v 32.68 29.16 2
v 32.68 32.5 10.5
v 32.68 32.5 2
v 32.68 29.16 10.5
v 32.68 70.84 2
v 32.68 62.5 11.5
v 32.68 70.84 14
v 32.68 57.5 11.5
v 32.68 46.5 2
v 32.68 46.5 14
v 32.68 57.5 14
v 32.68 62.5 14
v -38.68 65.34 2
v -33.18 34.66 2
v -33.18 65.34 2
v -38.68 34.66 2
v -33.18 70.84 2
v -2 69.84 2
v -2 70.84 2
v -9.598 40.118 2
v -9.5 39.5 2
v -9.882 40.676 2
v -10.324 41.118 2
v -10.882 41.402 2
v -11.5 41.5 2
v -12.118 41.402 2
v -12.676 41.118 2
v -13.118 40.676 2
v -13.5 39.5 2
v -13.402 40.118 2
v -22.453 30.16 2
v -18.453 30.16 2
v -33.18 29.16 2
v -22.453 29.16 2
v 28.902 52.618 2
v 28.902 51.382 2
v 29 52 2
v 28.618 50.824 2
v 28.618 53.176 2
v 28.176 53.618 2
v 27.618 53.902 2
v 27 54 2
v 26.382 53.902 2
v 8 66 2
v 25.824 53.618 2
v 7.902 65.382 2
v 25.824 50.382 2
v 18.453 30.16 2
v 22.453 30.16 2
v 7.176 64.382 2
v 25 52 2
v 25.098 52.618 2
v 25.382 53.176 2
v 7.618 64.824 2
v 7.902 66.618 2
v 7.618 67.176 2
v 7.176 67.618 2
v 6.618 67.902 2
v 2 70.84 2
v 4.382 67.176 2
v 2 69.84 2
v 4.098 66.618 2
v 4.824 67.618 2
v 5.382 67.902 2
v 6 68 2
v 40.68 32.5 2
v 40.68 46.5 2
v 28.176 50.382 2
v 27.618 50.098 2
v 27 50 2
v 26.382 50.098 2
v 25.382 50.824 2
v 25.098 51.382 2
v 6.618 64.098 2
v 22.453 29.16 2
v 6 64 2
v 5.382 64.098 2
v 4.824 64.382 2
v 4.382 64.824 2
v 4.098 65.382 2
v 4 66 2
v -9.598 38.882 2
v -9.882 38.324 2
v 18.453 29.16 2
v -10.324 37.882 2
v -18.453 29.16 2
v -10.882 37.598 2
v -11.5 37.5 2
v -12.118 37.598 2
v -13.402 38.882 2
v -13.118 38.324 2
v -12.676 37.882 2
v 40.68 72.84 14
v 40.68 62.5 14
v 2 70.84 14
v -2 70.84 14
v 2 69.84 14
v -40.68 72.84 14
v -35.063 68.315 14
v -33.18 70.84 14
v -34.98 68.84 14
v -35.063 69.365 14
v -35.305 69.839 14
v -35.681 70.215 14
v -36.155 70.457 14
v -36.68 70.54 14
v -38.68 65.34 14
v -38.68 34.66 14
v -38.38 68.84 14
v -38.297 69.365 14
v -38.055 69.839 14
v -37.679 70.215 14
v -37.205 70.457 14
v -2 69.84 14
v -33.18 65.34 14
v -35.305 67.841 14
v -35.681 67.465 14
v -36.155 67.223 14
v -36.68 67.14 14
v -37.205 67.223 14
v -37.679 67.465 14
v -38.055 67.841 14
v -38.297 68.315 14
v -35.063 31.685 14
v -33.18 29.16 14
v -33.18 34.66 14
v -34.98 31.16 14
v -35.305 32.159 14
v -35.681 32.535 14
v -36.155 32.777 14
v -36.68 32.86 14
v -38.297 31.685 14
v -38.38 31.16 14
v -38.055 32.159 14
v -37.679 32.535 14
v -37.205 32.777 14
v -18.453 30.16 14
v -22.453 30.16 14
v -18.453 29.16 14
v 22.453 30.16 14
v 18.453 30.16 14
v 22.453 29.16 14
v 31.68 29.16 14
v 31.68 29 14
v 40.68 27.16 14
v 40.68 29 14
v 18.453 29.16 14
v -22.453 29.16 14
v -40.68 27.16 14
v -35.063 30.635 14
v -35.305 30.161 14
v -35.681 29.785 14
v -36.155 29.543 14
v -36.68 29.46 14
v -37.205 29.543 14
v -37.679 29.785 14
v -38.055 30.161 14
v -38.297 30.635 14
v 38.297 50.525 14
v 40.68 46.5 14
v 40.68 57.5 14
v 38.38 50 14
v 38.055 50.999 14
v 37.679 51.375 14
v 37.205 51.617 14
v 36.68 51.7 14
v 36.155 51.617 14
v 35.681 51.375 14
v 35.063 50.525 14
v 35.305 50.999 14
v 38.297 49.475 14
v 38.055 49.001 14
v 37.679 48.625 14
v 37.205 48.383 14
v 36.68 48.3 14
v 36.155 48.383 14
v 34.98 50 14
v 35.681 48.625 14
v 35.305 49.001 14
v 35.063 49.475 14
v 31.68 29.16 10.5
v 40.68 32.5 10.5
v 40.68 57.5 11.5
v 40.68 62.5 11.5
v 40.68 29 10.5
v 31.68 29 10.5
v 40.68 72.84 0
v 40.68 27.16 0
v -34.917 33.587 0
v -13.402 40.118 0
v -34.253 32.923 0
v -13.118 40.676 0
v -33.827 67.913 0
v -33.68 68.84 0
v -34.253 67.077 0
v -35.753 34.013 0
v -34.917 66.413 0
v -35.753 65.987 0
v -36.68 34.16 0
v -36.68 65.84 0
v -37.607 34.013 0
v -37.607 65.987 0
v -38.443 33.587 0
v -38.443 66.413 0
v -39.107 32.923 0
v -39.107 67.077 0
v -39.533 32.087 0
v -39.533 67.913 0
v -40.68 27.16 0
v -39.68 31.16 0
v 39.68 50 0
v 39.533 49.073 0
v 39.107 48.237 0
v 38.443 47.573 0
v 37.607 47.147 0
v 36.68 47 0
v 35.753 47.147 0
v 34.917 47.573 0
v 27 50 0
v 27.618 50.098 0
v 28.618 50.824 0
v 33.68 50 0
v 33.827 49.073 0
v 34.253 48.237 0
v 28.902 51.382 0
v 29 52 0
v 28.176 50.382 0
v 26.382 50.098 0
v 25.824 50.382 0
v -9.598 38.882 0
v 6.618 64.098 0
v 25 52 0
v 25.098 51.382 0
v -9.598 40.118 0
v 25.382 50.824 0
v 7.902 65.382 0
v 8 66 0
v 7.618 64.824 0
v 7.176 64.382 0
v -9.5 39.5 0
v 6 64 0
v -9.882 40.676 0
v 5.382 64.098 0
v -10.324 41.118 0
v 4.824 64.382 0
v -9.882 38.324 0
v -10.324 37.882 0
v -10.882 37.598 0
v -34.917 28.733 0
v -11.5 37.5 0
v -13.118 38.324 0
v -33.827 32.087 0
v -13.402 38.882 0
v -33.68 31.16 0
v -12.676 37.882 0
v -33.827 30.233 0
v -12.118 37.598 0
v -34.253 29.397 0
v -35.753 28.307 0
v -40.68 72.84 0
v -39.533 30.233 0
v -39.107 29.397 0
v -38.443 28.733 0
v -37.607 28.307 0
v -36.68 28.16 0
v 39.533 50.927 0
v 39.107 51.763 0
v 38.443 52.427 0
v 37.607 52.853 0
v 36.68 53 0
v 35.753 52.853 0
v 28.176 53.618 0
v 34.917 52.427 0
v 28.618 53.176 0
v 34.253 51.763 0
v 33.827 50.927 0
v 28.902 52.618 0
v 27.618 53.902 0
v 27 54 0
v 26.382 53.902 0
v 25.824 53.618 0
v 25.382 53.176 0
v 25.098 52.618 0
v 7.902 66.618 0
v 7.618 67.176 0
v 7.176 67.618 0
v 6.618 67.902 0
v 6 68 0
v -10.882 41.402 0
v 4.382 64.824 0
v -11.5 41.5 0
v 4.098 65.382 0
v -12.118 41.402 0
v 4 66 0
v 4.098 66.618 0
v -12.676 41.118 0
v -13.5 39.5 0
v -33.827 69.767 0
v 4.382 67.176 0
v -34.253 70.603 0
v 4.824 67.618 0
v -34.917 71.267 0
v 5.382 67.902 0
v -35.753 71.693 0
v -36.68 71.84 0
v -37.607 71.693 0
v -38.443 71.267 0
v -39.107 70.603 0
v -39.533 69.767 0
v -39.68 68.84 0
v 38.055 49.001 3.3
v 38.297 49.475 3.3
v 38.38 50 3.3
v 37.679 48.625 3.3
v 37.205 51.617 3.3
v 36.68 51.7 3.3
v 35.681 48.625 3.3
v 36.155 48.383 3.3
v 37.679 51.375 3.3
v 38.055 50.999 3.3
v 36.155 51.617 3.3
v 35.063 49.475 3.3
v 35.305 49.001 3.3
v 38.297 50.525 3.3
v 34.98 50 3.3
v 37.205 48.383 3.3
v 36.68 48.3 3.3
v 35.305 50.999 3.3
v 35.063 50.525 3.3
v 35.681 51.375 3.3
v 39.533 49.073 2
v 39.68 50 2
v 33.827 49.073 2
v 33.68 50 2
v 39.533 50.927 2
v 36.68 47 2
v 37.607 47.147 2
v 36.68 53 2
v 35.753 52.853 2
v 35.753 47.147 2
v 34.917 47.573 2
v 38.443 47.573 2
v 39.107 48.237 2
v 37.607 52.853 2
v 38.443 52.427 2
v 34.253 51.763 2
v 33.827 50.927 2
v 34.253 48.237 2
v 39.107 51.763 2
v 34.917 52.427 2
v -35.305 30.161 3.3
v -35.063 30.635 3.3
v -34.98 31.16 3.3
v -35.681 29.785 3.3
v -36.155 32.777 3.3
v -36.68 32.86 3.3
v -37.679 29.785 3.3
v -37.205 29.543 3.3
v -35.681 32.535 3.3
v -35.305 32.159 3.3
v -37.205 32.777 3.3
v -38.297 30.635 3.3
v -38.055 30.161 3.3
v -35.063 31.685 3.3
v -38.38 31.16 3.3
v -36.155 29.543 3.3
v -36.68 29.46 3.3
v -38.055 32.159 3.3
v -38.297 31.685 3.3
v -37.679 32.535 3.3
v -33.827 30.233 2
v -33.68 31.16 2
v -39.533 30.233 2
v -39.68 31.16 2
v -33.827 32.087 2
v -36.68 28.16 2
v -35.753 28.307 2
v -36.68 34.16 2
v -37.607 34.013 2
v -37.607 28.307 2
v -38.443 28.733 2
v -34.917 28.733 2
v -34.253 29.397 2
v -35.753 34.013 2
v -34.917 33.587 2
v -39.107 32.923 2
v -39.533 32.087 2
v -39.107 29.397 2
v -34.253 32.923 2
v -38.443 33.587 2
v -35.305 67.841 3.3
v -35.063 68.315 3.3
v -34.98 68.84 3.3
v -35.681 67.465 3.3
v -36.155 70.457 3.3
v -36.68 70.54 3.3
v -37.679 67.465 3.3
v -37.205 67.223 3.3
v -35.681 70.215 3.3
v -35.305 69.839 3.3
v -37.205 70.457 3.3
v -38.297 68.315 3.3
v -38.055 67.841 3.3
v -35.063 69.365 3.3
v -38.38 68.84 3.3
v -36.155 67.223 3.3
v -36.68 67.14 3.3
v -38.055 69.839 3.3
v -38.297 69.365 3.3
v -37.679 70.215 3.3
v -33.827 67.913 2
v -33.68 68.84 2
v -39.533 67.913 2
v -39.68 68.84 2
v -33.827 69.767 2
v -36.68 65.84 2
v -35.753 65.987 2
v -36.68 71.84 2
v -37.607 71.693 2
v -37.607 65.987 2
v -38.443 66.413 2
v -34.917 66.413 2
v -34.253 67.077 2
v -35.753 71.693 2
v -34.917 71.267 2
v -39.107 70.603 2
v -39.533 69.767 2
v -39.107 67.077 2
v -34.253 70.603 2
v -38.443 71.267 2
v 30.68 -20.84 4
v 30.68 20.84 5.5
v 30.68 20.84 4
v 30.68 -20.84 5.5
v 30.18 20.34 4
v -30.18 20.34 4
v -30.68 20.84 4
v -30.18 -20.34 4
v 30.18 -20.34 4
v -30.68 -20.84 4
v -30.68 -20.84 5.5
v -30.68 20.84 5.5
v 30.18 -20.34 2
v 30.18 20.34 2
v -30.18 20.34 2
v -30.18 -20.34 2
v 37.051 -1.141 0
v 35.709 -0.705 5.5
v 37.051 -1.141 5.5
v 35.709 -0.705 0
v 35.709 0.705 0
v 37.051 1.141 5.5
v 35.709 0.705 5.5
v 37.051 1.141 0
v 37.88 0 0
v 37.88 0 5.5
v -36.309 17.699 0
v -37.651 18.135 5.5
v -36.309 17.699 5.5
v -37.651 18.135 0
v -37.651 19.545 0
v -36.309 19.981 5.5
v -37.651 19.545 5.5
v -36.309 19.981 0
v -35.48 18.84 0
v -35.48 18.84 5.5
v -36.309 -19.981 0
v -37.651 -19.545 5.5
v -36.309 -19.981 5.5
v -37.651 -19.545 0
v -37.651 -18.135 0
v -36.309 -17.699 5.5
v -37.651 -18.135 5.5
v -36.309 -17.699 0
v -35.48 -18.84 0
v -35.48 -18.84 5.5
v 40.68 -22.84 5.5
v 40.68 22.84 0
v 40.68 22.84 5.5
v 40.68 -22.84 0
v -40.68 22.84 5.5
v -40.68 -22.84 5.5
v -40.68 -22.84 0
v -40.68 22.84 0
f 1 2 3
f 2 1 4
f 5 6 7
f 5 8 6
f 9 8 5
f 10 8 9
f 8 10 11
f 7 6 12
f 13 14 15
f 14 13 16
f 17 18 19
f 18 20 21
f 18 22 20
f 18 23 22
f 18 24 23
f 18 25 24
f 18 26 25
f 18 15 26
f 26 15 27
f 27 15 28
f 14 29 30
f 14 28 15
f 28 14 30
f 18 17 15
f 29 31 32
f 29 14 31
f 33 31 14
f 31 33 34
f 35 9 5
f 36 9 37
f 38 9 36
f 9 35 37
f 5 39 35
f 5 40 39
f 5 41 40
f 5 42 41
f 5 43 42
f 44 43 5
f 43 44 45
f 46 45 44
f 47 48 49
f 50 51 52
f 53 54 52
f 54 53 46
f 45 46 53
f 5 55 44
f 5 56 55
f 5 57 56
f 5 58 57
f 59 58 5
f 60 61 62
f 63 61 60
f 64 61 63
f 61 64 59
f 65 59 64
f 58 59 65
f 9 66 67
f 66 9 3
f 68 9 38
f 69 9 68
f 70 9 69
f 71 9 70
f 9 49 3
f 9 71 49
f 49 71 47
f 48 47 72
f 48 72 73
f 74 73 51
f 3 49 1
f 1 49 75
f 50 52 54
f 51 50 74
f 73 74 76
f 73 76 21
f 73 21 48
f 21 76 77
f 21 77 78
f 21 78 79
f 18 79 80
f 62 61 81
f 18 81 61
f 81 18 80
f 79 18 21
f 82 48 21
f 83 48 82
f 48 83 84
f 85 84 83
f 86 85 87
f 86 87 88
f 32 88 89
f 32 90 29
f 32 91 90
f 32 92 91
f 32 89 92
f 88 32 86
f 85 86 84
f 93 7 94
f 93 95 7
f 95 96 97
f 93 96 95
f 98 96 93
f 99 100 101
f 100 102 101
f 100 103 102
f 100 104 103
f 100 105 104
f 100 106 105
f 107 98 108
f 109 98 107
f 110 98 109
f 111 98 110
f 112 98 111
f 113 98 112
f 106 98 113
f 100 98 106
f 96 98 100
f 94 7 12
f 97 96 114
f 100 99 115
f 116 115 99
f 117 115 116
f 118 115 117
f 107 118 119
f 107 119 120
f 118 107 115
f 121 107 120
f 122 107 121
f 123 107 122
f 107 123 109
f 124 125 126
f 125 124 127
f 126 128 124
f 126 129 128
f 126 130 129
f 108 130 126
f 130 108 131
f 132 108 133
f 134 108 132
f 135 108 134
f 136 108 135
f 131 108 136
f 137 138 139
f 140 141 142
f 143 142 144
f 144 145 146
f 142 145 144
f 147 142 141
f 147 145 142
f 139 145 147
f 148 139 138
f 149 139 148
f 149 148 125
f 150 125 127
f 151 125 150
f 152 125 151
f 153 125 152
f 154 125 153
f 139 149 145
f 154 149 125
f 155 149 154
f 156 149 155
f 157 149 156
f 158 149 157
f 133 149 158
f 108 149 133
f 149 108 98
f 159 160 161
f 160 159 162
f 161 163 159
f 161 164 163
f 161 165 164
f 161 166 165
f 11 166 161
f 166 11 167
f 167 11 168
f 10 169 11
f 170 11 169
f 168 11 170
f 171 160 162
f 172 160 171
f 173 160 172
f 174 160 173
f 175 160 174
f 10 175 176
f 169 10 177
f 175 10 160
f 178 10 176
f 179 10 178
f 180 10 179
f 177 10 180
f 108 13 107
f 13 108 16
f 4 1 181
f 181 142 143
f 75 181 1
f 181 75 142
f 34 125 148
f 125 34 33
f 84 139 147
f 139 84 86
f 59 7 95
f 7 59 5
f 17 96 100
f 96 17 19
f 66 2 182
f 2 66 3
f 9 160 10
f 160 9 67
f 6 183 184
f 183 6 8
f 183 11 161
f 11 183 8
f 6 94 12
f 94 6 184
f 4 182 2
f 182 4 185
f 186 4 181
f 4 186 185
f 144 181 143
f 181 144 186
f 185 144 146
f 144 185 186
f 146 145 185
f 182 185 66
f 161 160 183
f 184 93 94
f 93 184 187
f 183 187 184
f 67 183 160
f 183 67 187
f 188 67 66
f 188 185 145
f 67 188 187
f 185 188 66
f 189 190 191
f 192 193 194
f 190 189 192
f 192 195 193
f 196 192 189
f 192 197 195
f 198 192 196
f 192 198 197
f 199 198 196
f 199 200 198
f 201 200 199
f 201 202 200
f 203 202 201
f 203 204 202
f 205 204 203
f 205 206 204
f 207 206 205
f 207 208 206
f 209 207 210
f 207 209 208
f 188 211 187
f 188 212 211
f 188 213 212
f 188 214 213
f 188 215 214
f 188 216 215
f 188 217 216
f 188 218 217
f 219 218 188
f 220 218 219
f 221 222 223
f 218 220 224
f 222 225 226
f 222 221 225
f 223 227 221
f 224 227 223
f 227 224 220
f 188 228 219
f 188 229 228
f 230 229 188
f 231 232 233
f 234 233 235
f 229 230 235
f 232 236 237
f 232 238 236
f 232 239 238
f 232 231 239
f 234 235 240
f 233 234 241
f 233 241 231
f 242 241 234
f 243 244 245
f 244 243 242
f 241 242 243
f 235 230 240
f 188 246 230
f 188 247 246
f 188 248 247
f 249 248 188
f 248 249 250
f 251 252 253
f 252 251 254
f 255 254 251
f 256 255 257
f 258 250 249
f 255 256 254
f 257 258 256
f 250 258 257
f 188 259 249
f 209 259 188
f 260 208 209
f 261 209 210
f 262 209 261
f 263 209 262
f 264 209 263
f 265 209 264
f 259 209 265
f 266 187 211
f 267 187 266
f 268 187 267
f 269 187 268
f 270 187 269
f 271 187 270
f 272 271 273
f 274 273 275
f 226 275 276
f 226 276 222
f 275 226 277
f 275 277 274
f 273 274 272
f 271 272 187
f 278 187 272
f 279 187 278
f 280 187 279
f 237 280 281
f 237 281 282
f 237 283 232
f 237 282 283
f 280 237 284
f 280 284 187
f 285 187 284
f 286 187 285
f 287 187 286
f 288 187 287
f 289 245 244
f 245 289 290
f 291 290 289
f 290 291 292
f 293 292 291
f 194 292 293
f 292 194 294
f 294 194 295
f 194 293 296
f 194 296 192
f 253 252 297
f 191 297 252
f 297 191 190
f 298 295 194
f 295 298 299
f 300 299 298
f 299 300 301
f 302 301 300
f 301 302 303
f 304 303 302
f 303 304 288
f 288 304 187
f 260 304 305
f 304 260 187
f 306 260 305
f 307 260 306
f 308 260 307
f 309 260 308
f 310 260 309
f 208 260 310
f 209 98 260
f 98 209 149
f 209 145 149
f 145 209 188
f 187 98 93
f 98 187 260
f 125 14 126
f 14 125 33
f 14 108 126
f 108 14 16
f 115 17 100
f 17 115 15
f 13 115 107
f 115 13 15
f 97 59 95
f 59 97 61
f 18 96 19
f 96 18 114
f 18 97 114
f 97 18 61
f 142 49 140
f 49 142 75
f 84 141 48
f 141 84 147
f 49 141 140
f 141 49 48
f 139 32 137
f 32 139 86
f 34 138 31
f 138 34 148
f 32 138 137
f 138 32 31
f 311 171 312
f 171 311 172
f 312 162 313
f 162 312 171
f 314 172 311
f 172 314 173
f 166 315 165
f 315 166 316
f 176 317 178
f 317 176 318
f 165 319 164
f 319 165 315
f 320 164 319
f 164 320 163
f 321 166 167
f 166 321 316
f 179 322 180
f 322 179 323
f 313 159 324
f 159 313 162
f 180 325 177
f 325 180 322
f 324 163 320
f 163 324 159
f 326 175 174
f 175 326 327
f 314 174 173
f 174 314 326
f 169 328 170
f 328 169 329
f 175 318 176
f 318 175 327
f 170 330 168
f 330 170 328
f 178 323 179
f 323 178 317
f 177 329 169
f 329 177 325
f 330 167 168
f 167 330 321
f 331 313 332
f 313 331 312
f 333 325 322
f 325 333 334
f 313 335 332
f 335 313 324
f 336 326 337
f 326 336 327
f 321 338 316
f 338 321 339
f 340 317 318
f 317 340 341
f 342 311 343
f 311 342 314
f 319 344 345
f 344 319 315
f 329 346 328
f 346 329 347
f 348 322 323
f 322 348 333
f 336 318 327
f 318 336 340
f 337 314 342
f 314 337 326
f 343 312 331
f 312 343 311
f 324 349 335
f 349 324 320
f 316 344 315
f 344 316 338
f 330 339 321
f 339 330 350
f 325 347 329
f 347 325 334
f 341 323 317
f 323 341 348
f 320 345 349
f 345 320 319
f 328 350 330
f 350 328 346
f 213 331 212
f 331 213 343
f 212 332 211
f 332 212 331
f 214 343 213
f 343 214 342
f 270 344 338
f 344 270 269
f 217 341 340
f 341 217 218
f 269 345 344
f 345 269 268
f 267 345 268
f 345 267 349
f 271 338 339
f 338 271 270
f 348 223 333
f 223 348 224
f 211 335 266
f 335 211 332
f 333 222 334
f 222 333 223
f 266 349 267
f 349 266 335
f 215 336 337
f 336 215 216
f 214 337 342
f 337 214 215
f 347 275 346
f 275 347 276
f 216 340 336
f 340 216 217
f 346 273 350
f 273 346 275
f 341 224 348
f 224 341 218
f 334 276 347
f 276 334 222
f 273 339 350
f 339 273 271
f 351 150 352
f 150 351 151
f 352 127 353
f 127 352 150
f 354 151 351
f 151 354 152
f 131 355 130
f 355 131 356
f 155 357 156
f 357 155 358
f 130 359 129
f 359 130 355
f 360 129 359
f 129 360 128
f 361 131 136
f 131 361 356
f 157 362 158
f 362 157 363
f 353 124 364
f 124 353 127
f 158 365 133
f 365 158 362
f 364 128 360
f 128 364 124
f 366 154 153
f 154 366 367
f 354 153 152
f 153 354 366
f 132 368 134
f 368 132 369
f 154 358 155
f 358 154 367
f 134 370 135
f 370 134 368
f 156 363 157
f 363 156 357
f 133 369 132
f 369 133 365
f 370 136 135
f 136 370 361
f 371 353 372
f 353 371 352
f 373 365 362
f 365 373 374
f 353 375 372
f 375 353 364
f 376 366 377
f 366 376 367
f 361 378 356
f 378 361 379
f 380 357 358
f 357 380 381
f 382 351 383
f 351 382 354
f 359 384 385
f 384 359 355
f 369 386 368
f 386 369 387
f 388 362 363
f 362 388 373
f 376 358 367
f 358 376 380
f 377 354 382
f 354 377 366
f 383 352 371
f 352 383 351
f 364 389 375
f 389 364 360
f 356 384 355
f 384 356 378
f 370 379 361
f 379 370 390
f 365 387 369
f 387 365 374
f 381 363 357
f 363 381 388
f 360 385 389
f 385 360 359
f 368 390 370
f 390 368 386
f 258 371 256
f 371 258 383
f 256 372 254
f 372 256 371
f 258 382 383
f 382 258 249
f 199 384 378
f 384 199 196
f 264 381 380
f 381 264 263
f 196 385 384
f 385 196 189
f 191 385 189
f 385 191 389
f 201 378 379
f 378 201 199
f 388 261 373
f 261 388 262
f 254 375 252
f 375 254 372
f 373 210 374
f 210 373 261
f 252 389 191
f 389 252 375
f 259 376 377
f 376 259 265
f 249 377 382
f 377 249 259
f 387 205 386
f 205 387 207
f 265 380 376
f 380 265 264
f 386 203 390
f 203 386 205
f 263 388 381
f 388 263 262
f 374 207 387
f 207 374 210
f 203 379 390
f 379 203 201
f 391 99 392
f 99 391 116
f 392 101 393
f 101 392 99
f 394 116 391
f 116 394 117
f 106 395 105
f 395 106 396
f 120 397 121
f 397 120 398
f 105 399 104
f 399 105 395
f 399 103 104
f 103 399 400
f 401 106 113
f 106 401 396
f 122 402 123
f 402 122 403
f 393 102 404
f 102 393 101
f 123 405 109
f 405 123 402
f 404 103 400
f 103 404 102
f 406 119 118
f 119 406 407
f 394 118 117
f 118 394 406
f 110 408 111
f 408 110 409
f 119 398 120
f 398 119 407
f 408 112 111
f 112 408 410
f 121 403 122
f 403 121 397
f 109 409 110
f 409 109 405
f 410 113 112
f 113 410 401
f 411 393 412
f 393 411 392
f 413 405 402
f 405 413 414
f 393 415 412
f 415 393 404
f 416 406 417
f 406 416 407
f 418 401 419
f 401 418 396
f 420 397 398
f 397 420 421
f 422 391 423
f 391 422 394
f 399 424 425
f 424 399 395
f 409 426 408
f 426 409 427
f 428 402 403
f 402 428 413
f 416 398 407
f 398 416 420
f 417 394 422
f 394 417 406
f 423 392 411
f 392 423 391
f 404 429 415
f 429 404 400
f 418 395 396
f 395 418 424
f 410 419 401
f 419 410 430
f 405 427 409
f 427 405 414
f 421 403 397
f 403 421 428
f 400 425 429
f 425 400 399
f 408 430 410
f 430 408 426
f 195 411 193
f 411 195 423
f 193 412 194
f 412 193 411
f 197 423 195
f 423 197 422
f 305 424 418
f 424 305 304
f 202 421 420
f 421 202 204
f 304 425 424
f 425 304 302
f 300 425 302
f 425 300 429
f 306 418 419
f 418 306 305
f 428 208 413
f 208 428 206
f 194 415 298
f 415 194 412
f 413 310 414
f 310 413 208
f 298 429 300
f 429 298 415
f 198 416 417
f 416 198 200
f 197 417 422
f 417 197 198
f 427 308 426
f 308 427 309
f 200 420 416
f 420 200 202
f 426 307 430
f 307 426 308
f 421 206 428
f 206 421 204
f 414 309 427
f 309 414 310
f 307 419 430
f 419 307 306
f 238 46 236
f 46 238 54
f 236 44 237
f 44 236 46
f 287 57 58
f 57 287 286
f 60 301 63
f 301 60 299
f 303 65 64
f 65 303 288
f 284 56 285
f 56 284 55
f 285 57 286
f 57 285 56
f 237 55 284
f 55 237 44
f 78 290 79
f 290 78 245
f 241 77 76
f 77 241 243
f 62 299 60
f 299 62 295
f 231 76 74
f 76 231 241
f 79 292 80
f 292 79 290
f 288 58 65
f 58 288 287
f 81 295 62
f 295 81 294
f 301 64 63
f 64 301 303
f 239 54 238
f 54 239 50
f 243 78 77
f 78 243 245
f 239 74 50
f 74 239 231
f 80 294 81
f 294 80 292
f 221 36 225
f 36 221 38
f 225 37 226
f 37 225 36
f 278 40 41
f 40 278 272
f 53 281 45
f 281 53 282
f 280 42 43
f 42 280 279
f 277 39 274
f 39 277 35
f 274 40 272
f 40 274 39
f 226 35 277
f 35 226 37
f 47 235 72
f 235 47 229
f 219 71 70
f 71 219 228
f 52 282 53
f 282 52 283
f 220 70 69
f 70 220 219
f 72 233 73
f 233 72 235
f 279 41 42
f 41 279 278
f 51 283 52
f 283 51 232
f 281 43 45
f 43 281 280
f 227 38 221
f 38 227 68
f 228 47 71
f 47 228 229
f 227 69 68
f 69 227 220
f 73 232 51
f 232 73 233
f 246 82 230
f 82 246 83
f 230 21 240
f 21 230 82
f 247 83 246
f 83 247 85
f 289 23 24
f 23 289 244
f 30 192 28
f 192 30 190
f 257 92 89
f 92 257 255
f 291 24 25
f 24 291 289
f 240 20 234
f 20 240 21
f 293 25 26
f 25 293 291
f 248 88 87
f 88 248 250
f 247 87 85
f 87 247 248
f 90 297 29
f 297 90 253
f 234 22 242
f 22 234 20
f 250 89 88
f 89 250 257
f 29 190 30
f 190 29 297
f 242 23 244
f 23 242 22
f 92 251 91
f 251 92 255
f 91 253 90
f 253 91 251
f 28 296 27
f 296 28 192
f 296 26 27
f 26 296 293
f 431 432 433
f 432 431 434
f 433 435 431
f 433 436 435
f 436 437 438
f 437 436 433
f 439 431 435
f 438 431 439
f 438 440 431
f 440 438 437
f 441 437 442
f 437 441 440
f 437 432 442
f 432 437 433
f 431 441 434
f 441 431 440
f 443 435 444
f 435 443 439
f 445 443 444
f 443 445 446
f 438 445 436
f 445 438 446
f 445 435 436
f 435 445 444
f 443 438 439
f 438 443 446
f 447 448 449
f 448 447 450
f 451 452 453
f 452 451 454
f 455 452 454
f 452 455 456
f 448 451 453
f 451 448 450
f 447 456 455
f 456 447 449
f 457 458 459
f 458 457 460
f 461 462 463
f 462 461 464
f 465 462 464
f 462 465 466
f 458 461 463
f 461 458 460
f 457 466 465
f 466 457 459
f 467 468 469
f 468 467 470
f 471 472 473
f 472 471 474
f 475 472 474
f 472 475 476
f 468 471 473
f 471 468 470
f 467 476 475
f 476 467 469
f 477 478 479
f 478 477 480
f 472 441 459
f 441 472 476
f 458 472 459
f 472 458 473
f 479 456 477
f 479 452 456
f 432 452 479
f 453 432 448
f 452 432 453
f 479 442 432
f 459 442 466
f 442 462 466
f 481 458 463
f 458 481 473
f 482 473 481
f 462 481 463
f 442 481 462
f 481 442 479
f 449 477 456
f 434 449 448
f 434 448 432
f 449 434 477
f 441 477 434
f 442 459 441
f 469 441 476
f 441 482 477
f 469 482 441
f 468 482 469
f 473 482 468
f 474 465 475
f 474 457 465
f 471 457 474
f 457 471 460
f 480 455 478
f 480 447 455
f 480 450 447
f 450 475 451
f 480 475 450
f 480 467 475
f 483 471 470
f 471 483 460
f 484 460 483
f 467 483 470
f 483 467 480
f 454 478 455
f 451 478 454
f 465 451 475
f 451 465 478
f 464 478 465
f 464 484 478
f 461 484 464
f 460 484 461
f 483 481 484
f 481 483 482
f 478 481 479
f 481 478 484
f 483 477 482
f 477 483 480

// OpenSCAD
/*
 * focuser.stl -- case for the focuser 
 *
 * (c) 2016 Prof Dr Andreas Mueller, Hochschule Rapperswil
 */

board_width = 60.96 + 2 * 0.2;
board_height = 41.28 + 2 * 0.2;

w = board_width + 2 * 8;
h = board_height;
thickness = 1.5;
d = 10;

wall = 2;
W = w + 2 * wall;
H = h + 2 * wall;
D = d + 2 * wall;

dl = wall + 2 + thickness;
du = wall + d + 2;

module screwhole() {
    cylinder(r = 1.2, h = 20, center = true);
}

module bottom() {
	difference() {
		translate([0, 0, dl/2]) cube([W, H, dl], center = true);
		union() {
			translate([0, 0, wall + 2 + 1.5])
				cube([board_width, board_height, 3], center = true);
            translate([0, 0, wall + 5])
				cube([board_width - 1, board_height - 1, 10], center = true);
            // screw holes
            translate([board_width/2 + 6, 0, 0])
                screwhole();
            translate([-board_width/2 - 6, board_height/2 - 2, 0])
                screwhole();
            translate([-board_width/2 - 6, -board_height/2 + 2, 0])
                screwhole();
//            translate([0, 0, 5 + wall + 2 + 1.5 - 1])
//            difference() {
//                cube([W + 2, H + 2, 10], center = true);
//                cube([W - wall, H - wall, 12], center = true);
//            }
		}
	}
}

module screw() {
    union() {
        cylinder(r = 1.7, h = 30, center = true, $fn = 20);
        translate([0, 0, d-1])
            cylinder(r1 = 0, r2 = 3, h = 3, $fn = 20);
        translate([0, 0, d+2])
            cylinder(r = 3, h = 10, $fn = 20);
    }
}

module top() {
    difference() {
        union() {
            difference() {
                translate([0, 0, du / 2]) cube([W, H, du], center = true);
                union() {
                    translate([-3, 0, d/2 + 1])
                        cube([w - 6, h, d + 2], center = true);
                    // USB connector
                    translate([w / 2, 10.5, 10 - d + 2])
                        cube([20, 14, 20], center = true);
                    // motor cable opening
                    translate([w/2, -10, du/2 -d + 2.5])
                        cube([20, 5, 6], center = true);
                    // motor connector
                    //translate([w / 2, -10, du/2 - d + 2])
                    //    cube([20, 12, du], center = true);
                    // power cable opening
                    translate([w / 2 - 2, 12 + 4, 3.5 - d])
                        cube([10, 10, 20], center = true);
                }
            }
            translate([-board_width/2 - 6, board_height/2 - 2, du/2])
                cube([7, 7, du], center = true);
            translate([-board_width/2 - 6, -board_height/2 + 2, du/2])
                cube([7, 7, du], center = true);
            // board clamps bottom
            translate([0, -board_height/2, du/2])
                cube([4, 2, du], center = true);
            // board clamps top
            translate([board_width / 3, board_height/2, du/2])
                cube([4, 2, du], center = true);
            translate([-board_width / 3, board_height/2, du/2])
                cube([4, 2, du], center = true);
        }
        union() {
            // screw holes
            translate([board_width/2 + 6, 0, 0]) screw();
            translate([-board_width/2 - 6, board_height/2 - 2, 0]) screw();
            translate([-board_width/2 - 6, -board_height/2 + 2, 0]) screw();
            // LED holes
            translate([6, -16, 0])
                cylinder(r = 2.0, h = 30, center = true, $fn = 20);
            translate([27, -2, 0])
                cylinder(r = 2.0, h = 30, center = true, $fn = 20);
            translate([-11.5, 10.5, 0])
                cylinder(r = 2.0, h = 30, center = true, $fn = 20);
        }
    }
}

translate([0, 50, d + 4]) rotate([180, 0, 0]) top();
bottom();
